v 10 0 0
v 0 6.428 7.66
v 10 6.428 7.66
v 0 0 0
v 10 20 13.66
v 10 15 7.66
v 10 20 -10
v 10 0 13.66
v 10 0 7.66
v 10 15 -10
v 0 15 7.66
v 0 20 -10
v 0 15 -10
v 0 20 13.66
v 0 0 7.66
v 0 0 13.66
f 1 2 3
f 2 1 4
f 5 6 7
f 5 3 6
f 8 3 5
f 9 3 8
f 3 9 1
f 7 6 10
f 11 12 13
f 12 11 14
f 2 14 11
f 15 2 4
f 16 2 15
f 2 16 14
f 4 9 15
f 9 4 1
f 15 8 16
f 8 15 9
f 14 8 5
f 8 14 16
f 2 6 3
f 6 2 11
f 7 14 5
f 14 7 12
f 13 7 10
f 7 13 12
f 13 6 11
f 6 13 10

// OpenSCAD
angle = 50;

difference() {
	rotate([angle, 0, 0]) {
		cube(10);
	}
	translate([-1, -20, 0]) {
		cube(20);
	}
}
translate([0, 0, sin(angle) * 10]) {
	cube([10, 20, 6]);
}

translate([0, 15, -10]) {
	cube([10, 5, 20]);
}
